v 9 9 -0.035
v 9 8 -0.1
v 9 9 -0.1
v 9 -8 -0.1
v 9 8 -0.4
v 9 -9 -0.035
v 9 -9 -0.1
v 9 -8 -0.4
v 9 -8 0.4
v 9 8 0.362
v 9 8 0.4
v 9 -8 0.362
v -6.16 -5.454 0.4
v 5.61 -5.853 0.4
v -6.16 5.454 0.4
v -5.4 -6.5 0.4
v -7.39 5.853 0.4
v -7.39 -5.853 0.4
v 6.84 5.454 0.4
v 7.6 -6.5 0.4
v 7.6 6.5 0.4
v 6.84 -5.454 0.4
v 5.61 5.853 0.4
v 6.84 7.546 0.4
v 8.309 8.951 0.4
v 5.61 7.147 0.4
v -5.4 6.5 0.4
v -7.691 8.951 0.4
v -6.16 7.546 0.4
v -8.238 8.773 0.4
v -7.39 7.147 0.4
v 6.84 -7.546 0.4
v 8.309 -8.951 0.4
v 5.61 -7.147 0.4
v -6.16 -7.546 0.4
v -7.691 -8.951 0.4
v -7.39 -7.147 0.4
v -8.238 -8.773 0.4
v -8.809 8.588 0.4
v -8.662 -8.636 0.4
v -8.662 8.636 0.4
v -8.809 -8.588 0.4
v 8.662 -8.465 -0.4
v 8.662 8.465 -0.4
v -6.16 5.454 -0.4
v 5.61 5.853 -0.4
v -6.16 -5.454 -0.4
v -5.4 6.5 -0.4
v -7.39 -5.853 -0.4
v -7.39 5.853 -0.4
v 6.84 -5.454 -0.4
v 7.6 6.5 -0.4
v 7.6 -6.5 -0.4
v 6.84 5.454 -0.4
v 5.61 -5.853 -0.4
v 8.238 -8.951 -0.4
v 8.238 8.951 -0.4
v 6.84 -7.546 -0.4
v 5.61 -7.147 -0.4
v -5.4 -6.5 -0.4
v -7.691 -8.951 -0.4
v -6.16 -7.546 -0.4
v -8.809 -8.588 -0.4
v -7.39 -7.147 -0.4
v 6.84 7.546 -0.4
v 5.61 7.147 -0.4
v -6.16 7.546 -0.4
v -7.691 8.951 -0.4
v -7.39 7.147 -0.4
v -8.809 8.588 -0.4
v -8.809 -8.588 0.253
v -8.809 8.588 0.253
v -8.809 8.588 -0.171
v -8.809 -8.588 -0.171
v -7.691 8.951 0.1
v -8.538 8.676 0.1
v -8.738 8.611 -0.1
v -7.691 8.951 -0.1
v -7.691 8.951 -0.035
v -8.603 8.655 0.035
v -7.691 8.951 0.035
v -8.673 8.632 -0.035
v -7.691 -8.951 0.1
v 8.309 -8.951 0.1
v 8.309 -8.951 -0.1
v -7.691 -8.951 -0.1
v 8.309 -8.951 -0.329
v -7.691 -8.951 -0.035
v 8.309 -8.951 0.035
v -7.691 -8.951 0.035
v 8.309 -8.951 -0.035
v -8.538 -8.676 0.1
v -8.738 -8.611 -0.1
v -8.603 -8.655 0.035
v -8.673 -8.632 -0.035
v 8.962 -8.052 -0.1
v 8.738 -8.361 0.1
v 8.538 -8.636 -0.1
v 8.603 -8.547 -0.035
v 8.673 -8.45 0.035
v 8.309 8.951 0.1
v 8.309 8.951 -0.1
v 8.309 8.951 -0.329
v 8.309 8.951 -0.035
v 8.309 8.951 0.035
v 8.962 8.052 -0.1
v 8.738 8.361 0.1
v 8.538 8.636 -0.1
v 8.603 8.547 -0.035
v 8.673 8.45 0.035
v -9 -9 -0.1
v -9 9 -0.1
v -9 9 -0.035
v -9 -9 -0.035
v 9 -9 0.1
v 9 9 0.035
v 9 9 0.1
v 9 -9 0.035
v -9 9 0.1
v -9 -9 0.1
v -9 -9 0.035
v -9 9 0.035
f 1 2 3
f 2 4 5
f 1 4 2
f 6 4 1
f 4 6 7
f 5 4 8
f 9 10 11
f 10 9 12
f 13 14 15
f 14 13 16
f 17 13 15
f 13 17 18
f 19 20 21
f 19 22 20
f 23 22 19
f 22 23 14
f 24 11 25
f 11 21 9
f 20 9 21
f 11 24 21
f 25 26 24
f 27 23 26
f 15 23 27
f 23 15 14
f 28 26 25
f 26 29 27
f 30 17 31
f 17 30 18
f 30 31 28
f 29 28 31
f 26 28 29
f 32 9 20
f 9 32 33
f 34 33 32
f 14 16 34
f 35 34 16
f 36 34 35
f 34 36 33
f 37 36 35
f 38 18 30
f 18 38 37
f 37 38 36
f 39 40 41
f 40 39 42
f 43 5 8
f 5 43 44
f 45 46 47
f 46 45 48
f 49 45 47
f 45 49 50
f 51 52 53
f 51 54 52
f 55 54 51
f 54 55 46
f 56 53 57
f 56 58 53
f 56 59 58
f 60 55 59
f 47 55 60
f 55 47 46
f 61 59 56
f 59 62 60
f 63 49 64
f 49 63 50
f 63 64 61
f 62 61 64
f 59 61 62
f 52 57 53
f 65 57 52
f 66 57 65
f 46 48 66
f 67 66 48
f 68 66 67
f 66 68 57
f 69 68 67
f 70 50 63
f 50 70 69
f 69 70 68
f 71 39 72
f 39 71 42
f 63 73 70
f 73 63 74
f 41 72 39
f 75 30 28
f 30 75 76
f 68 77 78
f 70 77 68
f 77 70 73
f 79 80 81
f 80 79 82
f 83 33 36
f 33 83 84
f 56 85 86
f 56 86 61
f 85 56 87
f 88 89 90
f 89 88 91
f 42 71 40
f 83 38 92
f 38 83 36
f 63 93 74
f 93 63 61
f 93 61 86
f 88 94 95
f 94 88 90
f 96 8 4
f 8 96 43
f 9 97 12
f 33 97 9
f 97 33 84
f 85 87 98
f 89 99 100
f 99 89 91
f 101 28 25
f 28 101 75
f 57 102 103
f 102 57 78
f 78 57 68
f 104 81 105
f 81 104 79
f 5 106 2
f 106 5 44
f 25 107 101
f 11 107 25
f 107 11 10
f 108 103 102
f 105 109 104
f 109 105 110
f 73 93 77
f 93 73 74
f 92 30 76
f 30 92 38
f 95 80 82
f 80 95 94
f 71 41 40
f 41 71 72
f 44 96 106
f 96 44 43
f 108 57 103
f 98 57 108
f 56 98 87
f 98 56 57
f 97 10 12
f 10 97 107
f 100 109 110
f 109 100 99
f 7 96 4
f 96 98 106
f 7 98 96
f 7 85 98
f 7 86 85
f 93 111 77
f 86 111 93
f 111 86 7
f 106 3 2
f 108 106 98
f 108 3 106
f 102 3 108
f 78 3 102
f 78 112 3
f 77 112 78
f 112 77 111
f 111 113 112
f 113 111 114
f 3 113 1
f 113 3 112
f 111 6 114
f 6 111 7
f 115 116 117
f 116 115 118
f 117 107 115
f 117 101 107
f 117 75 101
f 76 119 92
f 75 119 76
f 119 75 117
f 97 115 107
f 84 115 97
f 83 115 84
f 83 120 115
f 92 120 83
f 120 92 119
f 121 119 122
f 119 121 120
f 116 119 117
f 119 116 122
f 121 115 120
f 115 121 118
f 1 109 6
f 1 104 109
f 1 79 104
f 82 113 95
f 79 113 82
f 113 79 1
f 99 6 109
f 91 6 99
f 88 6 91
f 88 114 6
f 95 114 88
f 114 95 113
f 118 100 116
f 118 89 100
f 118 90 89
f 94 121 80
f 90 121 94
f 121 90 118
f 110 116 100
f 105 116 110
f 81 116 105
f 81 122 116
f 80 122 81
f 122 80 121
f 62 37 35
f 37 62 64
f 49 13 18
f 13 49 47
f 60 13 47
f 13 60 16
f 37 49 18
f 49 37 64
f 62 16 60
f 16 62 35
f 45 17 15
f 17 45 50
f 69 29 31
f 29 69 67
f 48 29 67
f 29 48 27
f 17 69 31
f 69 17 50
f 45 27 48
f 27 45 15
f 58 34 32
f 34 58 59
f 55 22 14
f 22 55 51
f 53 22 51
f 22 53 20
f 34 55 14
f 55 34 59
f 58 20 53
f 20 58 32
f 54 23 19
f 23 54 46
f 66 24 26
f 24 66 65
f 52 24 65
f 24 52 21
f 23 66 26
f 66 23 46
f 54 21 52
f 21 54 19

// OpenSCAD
// Parameters
pcb_L = 18.0; //[9.0:36.0:0.1]
pcb_W = 18.0; //[9.0:36.0:0.1]
pcb_T = 0.8; //[0.4:1.6:0.05]
copper_T = 0.035; //[0.017:0.07:0.001]
mask_T = 0.02; //[0.01:0.05:0.001]
silk_T = 0.01; //[0.005:0.03:0.001]
corner_R = 1.0; //[0.5:2.0:0.1]
edge_chamfer = 0.3; //[0.1:0.8:0.05]
mount_hole_d = 2.0; //[1.0:3.5:0.1]
mount_hole_edge_margin = 2.5; //[1.5:5.0:0.1]
hole_clearance_extra = 0.2; //[0.0:0.6:0.05]

// PCB Body with Rounded Corners
module pcb_body_rounded() {
  difference() {
    intersection() {
      cube([pcb_L, pcb_W, pcb_T], center=true);
      hull() {
        translate([pcb_L/2 - corner_R, pcb_W/2 - corner_R, 0])
          cylinder(r=corner_R, h=pcb_T + 2*(copper_T + mask_T + silk_T), center=true);
        translate([-pcb_L/2 + corner_R, pcb_W/2 - corner_R, 0])
          cylinder(r=corner_R, h=pcb_T + 2*(copper_T + mask_T + silk_T), center=true);
        translate([-pcb_L/2 + corner_R, -pcb_W/2 + corner_R, 0])
          cylinder(r=corner_R, h=pcb_T + 2*(copper_T + mask_T + silk_T), center=true);
        translate([pcb_L/2 - corner_R, -pcb_W/2 + corner_R, 0])
          cylinder(r=corner_R, h=pcb_T + 2*(copper_T + mask_T + silk_T), center=true);
      }
    }
    // Edge Chamfers
    for (x = [-1, 1])
      for (y = [-1, 1])
        translate([x * (pcb_L/2 - edge_chamfer/2), y * (pcb_W/2 - edge_chamfer/2), 0])
          rotate([0, 45, 0])
            cube([edge_chamfer, pcb_W + 2*edge_chamfer, pcb_T + 2*(copper_T + mask_T + silk_T) + 2*edge_chamfer], center=true);
  }
}

// Copper Layers
module copper_layers() {
  union() {
    translate([0, 0, pcb_T/2 + copper_T/2 - 0.5])
      cube([pcb_L, pcb_W, copper_T], center=true);
    translate([0, 0, -pcb_T/2 - copper_T/2 + 0.5])
      cube([pcb_L, pcb_W, copper_T], center=true);
  }
}

// Solder Mask
module solder_mask() {
  union() {
    translate([0, 0, pcb_T/2 + copper_T + mask_T/2 - 0.5])
      cube([pcb_L, pcb_W, mask_T], center=true);
    translate([0, 0, -pcb_T/2 - copper_T - mask_T/2 + 0.5])
      cube([pcb_L, pcb_W, mask_T], center=true);
  }
}

// Silkscreen
module silkscreen() {
  union() {
    translate([0, 0, pcb_T/2 + copper_T + mask_T + silk_T/2 - 0.5])
      cube([pcb_L, pcb_W, silk_T], center=true);
    translate([0, 0, -pcb_T/2 - copper_T - mask_T - silk_T/2 + 0.5])
      cube([pcb_L, pcb_W, silk_T], center=true);
  }
}

// Mounting Holes
module mounting_holes() {
  for (x = [-1, 1])
    for (y = [-1, 1])
      translate([x * (pcb_L/2 - mount_hole_edge_margin), y * (pcb_W/2 - mount_hole_edge_margin), 0])
        cylinder(r=(mount_hole_d + hole_clearance_extra)/2, h=pcb_T + 2*(copper_T + mask_T + silk_T) + 2, center=true);
}

// Complete PCB Model
module complete_model() {
  difference() {
    union() {
      pcb_body_rounded();
      copper_layers();
      solder_mask();
      silkscreen();
    }
    mounting_holes();
  }
}

// Render the complete model
color([0.0, 0.4, 0.2]) // PCB green color
complete_model();
